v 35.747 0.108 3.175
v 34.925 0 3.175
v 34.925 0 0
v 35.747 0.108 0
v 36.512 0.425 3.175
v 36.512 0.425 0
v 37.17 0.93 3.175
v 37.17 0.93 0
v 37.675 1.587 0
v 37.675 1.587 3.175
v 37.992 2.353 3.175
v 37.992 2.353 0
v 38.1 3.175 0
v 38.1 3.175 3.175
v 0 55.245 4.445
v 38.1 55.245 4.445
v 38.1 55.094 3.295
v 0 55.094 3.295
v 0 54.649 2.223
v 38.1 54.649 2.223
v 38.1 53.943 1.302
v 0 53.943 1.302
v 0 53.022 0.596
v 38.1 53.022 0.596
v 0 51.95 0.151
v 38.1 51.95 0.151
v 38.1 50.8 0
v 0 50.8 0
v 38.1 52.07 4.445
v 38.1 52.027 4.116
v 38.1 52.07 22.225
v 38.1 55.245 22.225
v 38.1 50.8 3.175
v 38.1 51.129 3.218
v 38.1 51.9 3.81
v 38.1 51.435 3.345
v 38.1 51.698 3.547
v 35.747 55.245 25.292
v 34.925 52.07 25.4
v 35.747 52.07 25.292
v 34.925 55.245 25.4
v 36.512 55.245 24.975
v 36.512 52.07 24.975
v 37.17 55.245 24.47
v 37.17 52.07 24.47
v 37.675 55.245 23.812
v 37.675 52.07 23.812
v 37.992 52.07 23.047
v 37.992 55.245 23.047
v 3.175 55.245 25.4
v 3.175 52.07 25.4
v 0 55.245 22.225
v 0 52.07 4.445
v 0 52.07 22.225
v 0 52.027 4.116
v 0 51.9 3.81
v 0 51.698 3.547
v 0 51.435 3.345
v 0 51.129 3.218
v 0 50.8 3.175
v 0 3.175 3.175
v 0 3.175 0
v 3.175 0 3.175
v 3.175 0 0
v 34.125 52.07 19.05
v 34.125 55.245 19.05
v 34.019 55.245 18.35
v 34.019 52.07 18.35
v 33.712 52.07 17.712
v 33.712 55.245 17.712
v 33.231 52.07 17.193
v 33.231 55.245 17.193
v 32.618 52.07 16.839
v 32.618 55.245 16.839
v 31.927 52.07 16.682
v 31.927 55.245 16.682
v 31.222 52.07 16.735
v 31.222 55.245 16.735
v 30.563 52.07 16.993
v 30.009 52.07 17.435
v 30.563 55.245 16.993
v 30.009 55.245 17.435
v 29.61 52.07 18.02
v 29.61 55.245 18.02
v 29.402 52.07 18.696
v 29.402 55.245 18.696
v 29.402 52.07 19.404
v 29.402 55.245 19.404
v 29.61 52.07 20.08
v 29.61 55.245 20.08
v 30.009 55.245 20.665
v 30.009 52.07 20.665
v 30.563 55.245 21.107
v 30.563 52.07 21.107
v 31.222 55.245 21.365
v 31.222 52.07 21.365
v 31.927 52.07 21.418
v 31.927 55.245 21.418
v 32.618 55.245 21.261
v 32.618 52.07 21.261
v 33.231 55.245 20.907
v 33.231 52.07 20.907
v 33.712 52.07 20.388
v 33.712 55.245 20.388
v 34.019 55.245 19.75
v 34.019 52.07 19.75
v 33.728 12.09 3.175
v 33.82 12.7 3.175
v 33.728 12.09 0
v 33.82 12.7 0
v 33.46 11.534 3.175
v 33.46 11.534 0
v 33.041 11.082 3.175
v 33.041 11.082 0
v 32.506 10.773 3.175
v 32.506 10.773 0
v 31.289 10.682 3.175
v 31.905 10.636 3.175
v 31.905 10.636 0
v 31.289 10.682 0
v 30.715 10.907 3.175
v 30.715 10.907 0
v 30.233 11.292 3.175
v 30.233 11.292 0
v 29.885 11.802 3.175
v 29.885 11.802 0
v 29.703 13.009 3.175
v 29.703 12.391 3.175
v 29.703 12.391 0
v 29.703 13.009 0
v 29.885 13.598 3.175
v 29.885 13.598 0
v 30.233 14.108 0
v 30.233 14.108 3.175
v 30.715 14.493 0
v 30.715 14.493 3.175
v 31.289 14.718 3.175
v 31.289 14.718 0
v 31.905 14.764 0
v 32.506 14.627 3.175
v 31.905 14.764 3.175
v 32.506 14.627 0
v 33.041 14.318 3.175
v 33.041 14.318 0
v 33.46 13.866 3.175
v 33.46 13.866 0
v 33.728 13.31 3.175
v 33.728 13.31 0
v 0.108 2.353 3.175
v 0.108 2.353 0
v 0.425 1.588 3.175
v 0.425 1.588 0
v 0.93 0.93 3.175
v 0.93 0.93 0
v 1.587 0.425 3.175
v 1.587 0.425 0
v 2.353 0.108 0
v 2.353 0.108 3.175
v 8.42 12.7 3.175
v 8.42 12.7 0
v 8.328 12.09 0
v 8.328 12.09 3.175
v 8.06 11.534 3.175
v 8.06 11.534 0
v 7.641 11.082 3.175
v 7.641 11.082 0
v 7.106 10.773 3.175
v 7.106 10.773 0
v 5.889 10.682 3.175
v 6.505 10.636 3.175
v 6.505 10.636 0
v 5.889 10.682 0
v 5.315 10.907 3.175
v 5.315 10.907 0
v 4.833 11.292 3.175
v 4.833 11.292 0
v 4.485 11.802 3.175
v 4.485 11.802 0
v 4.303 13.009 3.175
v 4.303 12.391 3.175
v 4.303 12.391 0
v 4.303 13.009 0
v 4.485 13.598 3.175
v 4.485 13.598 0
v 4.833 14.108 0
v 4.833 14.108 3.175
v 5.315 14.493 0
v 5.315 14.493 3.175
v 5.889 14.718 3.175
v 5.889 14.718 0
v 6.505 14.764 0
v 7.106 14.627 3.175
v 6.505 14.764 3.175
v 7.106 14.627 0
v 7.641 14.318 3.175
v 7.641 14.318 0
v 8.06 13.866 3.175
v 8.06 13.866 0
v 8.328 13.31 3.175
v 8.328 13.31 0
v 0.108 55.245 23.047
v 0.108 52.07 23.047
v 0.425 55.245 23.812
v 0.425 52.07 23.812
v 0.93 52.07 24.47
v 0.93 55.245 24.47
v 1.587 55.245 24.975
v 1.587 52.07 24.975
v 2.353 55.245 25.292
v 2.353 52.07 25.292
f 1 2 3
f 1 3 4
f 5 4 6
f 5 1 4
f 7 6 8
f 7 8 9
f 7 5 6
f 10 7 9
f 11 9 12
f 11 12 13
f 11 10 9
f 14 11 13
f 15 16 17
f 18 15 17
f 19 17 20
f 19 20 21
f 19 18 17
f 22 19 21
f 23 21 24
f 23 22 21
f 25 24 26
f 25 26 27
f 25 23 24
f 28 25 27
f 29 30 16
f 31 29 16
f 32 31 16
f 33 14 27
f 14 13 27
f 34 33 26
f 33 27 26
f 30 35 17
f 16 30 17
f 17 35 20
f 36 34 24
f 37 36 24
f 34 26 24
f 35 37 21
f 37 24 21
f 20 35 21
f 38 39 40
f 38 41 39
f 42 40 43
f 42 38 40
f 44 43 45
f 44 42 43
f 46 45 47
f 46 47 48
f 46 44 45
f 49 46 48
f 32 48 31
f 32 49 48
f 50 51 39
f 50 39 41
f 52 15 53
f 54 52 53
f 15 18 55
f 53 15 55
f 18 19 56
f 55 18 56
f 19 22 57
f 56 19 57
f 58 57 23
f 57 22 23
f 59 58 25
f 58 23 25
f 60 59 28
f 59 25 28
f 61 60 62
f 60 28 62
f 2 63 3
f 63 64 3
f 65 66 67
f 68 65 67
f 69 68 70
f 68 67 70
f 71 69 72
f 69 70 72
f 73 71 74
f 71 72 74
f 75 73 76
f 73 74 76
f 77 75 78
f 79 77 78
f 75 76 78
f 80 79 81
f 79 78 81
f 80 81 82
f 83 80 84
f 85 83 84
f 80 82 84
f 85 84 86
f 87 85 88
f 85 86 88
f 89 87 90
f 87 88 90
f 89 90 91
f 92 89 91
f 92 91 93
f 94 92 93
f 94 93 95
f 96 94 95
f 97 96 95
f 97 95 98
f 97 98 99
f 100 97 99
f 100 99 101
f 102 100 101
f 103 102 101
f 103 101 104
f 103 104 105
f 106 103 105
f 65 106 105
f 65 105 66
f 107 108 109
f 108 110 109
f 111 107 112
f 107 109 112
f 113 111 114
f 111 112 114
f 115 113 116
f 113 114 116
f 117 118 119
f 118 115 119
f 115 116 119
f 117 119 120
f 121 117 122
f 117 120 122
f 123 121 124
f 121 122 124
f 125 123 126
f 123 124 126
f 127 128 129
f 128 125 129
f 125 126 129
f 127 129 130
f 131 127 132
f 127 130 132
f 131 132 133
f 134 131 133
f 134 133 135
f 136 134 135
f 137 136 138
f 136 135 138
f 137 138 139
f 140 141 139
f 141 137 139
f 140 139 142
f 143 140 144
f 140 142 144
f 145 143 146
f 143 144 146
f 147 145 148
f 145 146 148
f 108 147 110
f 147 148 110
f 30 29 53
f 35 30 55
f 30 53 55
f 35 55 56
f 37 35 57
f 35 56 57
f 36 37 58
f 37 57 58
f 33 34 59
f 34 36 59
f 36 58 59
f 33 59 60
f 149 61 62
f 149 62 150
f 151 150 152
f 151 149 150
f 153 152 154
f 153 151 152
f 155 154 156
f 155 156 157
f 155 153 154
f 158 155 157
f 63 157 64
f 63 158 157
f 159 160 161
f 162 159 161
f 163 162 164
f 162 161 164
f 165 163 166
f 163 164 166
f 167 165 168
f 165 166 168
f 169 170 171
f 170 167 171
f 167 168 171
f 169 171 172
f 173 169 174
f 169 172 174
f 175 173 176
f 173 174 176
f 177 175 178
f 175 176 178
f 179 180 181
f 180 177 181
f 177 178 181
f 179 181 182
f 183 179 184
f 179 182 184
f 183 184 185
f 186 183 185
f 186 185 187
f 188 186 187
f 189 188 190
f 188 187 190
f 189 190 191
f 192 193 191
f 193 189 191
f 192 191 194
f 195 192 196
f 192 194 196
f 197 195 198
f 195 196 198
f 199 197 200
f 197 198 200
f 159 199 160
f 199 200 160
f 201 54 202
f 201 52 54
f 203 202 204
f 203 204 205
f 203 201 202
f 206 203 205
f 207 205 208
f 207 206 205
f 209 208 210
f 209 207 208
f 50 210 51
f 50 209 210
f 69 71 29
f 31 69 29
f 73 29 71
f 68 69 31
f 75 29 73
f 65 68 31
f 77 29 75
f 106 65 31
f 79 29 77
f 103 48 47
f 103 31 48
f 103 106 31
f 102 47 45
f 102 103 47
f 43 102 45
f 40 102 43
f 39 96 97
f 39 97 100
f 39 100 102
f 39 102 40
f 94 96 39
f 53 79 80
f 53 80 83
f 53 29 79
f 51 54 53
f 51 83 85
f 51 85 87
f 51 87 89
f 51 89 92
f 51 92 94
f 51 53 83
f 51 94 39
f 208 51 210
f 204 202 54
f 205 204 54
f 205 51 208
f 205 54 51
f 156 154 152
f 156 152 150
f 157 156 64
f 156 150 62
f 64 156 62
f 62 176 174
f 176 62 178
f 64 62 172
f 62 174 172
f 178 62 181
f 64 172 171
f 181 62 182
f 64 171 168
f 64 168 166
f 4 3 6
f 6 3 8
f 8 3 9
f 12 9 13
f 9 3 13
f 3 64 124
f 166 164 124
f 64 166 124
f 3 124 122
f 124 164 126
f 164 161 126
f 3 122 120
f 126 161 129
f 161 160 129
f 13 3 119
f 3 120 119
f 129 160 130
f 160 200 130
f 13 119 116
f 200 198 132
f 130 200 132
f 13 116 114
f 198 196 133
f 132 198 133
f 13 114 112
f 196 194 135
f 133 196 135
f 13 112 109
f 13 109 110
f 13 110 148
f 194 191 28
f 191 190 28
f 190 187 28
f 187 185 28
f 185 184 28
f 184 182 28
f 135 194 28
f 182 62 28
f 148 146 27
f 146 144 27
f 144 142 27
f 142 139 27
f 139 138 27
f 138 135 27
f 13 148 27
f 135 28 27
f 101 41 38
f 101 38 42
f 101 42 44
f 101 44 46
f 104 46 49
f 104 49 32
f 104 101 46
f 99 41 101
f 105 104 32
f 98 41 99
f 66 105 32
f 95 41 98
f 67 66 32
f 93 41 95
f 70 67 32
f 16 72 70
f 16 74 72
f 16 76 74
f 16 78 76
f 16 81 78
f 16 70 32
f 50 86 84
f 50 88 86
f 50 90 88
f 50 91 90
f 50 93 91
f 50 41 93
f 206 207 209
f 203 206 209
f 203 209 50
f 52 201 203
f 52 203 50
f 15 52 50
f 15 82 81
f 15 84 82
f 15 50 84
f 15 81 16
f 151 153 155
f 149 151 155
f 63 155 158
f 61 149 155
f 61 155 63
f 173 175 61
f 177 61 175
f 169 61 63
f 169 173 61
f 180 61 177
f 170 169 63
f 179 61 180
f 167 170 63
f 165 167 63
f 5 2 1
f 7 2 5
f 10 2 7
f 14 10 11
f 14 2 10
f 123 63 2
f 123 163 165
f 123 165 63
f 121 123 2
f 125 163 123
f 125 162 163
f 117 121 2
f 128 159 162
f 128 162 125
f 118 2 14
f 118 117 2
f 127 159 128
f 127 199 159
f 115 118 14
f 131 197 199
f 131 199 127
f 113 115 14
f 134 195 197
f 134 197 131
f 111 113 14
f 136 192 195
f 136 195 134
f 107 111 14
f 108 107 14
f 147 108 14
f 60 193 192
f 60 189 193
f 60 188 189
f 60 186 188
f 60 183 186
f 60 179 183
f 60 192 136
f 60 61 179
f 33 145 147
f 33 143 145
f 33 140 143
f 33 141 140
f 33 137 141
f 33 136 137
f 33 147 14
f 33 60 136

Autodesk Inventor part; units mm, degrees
ref_plane "YZ Plane" through (0, 0, 0) normal (1, 0, 0) x (0, 1, 0)
ref_plane "XZ Plane" through (0, 0, 0) normal (0, 1, 0) x (-1, 0, 0)
ref_plane "XY Plane" through (0, 0, 0) normal (0, 0, 1) x (1, 0, 0)
sketch "Sketch1" plane through (0, 0, 0) normal (0, 0, 1) x (1, 0, 0)
  line L0 (0, 0) -> (38.1, 0)
  line L1 (38.1, 0) -> (38.1, 50.8)
  line L2 (38.1, 50.8) -> (0, 50.8)
  line L3 (0, 50.8) -> (0, 0)
  circle A0 centre (6.35, 12.7) radius 2.0701
  line L4 (0, 12.7) -> (38.1, 12.7) construction
  circle A1 centre (31.75, 12.7) radius 2.0701
  dimension "d0" = 38.1
  dimension "d1" = 50.8
  dimension "d2" = 4.1402
  dimension "d3" = 6.35
  dimension "d6" = 25.4
  dimension "d22" = 12.7
extrude "Plate1" add sketch "Sketch1" along normal blind 3.175
sketch "Sketch2" plane through (0, 52.07, 4.445) normal (0, 1, 0) x (-1, 0, 0)
  line L0 (-38.1, 0) -> (0, 0)
  line L1 (0, 0) -> (0, 20.955)
  line L2 (0, 20.955) -> (-38.1, 20.955)
  line L3 (-38.1, 20.955) -> (-38.1, 0)
edge flange "Flange1" height 25.4 angle 90 thickness 3.175 bend radius 1.27 thickness toward (0, 1, 0) relief tear relief width 3.175 relief depth 1.5875 edges at (19.05, 50.8, 3.175) wall of the first edge with corners at (38.1, 52.07, 4.445) (0, 52.07, 4.445) (0, 52.07, 25.4) (38.1, 52.07, 25.4)
bend "Bend1"
corner "Corner1"
sketch "Sketch4" plane through (0, 55.245, 25.4) normal (0, 1, 0) x (1, 0, 0)
  line L0 (38.1, 0) -> (0, 0) projected
  line L1 (38.1, 20.955) -> (38.1, 0) projected
  circle A0 centre (31.75, 6.35) radius 2.3749
  point P0 (0, 25.4)
  dimension "d28" = 4.7498
  dimension "d29" = 6.35
  dimension "d30" = 6.35
extrude "Cut2" cut sketch "Sketch4" against normal blind 3.175
fillet "Fillet1" radius 3.175 4 edges at (38.1, 53.6575, 25.4) (0, 53.6575, 25.4) (38.1, 0, 1.5875) (0, 0, 1.5875)
equation "\"d31\" = Thickness"
equation "\"d12\" = BendReliefWidth"
equation "\"d13\" = BendReliefDepth"
equation "\"d14\" = MinimumRemnant"
equation "\"d15\" = BendRadius"
equation "\"d19\" = CornerReliefSize"
equation "\"d20\" = GapSize"
equation "\"d21\" = JacobiRadiusSize"
equation "\"BendRadius\" = Thickness"
equation "\"BendReliefWidth\" = Thickness"
equation "\"BendReliefDepth\" = 0.5 * Thickness"
equation "\"CornerReliefSize\" = 4 * Thickness"
equation "\"MinimumRemnant\" = 2 * Thickness"
equation "\"TransitionRadius\" = BendRadius"
equation "\"JacobiRadiusSize\" = BendRadius"
equation "\"GapSize\" = Thickness"
equation "\"d11\" = BendRadius"
equation "\"Thickness\" = 3.175"
properties part number "Pneumatic Piston Front Flange (Right Custom)" material "Aluminum 6061"
